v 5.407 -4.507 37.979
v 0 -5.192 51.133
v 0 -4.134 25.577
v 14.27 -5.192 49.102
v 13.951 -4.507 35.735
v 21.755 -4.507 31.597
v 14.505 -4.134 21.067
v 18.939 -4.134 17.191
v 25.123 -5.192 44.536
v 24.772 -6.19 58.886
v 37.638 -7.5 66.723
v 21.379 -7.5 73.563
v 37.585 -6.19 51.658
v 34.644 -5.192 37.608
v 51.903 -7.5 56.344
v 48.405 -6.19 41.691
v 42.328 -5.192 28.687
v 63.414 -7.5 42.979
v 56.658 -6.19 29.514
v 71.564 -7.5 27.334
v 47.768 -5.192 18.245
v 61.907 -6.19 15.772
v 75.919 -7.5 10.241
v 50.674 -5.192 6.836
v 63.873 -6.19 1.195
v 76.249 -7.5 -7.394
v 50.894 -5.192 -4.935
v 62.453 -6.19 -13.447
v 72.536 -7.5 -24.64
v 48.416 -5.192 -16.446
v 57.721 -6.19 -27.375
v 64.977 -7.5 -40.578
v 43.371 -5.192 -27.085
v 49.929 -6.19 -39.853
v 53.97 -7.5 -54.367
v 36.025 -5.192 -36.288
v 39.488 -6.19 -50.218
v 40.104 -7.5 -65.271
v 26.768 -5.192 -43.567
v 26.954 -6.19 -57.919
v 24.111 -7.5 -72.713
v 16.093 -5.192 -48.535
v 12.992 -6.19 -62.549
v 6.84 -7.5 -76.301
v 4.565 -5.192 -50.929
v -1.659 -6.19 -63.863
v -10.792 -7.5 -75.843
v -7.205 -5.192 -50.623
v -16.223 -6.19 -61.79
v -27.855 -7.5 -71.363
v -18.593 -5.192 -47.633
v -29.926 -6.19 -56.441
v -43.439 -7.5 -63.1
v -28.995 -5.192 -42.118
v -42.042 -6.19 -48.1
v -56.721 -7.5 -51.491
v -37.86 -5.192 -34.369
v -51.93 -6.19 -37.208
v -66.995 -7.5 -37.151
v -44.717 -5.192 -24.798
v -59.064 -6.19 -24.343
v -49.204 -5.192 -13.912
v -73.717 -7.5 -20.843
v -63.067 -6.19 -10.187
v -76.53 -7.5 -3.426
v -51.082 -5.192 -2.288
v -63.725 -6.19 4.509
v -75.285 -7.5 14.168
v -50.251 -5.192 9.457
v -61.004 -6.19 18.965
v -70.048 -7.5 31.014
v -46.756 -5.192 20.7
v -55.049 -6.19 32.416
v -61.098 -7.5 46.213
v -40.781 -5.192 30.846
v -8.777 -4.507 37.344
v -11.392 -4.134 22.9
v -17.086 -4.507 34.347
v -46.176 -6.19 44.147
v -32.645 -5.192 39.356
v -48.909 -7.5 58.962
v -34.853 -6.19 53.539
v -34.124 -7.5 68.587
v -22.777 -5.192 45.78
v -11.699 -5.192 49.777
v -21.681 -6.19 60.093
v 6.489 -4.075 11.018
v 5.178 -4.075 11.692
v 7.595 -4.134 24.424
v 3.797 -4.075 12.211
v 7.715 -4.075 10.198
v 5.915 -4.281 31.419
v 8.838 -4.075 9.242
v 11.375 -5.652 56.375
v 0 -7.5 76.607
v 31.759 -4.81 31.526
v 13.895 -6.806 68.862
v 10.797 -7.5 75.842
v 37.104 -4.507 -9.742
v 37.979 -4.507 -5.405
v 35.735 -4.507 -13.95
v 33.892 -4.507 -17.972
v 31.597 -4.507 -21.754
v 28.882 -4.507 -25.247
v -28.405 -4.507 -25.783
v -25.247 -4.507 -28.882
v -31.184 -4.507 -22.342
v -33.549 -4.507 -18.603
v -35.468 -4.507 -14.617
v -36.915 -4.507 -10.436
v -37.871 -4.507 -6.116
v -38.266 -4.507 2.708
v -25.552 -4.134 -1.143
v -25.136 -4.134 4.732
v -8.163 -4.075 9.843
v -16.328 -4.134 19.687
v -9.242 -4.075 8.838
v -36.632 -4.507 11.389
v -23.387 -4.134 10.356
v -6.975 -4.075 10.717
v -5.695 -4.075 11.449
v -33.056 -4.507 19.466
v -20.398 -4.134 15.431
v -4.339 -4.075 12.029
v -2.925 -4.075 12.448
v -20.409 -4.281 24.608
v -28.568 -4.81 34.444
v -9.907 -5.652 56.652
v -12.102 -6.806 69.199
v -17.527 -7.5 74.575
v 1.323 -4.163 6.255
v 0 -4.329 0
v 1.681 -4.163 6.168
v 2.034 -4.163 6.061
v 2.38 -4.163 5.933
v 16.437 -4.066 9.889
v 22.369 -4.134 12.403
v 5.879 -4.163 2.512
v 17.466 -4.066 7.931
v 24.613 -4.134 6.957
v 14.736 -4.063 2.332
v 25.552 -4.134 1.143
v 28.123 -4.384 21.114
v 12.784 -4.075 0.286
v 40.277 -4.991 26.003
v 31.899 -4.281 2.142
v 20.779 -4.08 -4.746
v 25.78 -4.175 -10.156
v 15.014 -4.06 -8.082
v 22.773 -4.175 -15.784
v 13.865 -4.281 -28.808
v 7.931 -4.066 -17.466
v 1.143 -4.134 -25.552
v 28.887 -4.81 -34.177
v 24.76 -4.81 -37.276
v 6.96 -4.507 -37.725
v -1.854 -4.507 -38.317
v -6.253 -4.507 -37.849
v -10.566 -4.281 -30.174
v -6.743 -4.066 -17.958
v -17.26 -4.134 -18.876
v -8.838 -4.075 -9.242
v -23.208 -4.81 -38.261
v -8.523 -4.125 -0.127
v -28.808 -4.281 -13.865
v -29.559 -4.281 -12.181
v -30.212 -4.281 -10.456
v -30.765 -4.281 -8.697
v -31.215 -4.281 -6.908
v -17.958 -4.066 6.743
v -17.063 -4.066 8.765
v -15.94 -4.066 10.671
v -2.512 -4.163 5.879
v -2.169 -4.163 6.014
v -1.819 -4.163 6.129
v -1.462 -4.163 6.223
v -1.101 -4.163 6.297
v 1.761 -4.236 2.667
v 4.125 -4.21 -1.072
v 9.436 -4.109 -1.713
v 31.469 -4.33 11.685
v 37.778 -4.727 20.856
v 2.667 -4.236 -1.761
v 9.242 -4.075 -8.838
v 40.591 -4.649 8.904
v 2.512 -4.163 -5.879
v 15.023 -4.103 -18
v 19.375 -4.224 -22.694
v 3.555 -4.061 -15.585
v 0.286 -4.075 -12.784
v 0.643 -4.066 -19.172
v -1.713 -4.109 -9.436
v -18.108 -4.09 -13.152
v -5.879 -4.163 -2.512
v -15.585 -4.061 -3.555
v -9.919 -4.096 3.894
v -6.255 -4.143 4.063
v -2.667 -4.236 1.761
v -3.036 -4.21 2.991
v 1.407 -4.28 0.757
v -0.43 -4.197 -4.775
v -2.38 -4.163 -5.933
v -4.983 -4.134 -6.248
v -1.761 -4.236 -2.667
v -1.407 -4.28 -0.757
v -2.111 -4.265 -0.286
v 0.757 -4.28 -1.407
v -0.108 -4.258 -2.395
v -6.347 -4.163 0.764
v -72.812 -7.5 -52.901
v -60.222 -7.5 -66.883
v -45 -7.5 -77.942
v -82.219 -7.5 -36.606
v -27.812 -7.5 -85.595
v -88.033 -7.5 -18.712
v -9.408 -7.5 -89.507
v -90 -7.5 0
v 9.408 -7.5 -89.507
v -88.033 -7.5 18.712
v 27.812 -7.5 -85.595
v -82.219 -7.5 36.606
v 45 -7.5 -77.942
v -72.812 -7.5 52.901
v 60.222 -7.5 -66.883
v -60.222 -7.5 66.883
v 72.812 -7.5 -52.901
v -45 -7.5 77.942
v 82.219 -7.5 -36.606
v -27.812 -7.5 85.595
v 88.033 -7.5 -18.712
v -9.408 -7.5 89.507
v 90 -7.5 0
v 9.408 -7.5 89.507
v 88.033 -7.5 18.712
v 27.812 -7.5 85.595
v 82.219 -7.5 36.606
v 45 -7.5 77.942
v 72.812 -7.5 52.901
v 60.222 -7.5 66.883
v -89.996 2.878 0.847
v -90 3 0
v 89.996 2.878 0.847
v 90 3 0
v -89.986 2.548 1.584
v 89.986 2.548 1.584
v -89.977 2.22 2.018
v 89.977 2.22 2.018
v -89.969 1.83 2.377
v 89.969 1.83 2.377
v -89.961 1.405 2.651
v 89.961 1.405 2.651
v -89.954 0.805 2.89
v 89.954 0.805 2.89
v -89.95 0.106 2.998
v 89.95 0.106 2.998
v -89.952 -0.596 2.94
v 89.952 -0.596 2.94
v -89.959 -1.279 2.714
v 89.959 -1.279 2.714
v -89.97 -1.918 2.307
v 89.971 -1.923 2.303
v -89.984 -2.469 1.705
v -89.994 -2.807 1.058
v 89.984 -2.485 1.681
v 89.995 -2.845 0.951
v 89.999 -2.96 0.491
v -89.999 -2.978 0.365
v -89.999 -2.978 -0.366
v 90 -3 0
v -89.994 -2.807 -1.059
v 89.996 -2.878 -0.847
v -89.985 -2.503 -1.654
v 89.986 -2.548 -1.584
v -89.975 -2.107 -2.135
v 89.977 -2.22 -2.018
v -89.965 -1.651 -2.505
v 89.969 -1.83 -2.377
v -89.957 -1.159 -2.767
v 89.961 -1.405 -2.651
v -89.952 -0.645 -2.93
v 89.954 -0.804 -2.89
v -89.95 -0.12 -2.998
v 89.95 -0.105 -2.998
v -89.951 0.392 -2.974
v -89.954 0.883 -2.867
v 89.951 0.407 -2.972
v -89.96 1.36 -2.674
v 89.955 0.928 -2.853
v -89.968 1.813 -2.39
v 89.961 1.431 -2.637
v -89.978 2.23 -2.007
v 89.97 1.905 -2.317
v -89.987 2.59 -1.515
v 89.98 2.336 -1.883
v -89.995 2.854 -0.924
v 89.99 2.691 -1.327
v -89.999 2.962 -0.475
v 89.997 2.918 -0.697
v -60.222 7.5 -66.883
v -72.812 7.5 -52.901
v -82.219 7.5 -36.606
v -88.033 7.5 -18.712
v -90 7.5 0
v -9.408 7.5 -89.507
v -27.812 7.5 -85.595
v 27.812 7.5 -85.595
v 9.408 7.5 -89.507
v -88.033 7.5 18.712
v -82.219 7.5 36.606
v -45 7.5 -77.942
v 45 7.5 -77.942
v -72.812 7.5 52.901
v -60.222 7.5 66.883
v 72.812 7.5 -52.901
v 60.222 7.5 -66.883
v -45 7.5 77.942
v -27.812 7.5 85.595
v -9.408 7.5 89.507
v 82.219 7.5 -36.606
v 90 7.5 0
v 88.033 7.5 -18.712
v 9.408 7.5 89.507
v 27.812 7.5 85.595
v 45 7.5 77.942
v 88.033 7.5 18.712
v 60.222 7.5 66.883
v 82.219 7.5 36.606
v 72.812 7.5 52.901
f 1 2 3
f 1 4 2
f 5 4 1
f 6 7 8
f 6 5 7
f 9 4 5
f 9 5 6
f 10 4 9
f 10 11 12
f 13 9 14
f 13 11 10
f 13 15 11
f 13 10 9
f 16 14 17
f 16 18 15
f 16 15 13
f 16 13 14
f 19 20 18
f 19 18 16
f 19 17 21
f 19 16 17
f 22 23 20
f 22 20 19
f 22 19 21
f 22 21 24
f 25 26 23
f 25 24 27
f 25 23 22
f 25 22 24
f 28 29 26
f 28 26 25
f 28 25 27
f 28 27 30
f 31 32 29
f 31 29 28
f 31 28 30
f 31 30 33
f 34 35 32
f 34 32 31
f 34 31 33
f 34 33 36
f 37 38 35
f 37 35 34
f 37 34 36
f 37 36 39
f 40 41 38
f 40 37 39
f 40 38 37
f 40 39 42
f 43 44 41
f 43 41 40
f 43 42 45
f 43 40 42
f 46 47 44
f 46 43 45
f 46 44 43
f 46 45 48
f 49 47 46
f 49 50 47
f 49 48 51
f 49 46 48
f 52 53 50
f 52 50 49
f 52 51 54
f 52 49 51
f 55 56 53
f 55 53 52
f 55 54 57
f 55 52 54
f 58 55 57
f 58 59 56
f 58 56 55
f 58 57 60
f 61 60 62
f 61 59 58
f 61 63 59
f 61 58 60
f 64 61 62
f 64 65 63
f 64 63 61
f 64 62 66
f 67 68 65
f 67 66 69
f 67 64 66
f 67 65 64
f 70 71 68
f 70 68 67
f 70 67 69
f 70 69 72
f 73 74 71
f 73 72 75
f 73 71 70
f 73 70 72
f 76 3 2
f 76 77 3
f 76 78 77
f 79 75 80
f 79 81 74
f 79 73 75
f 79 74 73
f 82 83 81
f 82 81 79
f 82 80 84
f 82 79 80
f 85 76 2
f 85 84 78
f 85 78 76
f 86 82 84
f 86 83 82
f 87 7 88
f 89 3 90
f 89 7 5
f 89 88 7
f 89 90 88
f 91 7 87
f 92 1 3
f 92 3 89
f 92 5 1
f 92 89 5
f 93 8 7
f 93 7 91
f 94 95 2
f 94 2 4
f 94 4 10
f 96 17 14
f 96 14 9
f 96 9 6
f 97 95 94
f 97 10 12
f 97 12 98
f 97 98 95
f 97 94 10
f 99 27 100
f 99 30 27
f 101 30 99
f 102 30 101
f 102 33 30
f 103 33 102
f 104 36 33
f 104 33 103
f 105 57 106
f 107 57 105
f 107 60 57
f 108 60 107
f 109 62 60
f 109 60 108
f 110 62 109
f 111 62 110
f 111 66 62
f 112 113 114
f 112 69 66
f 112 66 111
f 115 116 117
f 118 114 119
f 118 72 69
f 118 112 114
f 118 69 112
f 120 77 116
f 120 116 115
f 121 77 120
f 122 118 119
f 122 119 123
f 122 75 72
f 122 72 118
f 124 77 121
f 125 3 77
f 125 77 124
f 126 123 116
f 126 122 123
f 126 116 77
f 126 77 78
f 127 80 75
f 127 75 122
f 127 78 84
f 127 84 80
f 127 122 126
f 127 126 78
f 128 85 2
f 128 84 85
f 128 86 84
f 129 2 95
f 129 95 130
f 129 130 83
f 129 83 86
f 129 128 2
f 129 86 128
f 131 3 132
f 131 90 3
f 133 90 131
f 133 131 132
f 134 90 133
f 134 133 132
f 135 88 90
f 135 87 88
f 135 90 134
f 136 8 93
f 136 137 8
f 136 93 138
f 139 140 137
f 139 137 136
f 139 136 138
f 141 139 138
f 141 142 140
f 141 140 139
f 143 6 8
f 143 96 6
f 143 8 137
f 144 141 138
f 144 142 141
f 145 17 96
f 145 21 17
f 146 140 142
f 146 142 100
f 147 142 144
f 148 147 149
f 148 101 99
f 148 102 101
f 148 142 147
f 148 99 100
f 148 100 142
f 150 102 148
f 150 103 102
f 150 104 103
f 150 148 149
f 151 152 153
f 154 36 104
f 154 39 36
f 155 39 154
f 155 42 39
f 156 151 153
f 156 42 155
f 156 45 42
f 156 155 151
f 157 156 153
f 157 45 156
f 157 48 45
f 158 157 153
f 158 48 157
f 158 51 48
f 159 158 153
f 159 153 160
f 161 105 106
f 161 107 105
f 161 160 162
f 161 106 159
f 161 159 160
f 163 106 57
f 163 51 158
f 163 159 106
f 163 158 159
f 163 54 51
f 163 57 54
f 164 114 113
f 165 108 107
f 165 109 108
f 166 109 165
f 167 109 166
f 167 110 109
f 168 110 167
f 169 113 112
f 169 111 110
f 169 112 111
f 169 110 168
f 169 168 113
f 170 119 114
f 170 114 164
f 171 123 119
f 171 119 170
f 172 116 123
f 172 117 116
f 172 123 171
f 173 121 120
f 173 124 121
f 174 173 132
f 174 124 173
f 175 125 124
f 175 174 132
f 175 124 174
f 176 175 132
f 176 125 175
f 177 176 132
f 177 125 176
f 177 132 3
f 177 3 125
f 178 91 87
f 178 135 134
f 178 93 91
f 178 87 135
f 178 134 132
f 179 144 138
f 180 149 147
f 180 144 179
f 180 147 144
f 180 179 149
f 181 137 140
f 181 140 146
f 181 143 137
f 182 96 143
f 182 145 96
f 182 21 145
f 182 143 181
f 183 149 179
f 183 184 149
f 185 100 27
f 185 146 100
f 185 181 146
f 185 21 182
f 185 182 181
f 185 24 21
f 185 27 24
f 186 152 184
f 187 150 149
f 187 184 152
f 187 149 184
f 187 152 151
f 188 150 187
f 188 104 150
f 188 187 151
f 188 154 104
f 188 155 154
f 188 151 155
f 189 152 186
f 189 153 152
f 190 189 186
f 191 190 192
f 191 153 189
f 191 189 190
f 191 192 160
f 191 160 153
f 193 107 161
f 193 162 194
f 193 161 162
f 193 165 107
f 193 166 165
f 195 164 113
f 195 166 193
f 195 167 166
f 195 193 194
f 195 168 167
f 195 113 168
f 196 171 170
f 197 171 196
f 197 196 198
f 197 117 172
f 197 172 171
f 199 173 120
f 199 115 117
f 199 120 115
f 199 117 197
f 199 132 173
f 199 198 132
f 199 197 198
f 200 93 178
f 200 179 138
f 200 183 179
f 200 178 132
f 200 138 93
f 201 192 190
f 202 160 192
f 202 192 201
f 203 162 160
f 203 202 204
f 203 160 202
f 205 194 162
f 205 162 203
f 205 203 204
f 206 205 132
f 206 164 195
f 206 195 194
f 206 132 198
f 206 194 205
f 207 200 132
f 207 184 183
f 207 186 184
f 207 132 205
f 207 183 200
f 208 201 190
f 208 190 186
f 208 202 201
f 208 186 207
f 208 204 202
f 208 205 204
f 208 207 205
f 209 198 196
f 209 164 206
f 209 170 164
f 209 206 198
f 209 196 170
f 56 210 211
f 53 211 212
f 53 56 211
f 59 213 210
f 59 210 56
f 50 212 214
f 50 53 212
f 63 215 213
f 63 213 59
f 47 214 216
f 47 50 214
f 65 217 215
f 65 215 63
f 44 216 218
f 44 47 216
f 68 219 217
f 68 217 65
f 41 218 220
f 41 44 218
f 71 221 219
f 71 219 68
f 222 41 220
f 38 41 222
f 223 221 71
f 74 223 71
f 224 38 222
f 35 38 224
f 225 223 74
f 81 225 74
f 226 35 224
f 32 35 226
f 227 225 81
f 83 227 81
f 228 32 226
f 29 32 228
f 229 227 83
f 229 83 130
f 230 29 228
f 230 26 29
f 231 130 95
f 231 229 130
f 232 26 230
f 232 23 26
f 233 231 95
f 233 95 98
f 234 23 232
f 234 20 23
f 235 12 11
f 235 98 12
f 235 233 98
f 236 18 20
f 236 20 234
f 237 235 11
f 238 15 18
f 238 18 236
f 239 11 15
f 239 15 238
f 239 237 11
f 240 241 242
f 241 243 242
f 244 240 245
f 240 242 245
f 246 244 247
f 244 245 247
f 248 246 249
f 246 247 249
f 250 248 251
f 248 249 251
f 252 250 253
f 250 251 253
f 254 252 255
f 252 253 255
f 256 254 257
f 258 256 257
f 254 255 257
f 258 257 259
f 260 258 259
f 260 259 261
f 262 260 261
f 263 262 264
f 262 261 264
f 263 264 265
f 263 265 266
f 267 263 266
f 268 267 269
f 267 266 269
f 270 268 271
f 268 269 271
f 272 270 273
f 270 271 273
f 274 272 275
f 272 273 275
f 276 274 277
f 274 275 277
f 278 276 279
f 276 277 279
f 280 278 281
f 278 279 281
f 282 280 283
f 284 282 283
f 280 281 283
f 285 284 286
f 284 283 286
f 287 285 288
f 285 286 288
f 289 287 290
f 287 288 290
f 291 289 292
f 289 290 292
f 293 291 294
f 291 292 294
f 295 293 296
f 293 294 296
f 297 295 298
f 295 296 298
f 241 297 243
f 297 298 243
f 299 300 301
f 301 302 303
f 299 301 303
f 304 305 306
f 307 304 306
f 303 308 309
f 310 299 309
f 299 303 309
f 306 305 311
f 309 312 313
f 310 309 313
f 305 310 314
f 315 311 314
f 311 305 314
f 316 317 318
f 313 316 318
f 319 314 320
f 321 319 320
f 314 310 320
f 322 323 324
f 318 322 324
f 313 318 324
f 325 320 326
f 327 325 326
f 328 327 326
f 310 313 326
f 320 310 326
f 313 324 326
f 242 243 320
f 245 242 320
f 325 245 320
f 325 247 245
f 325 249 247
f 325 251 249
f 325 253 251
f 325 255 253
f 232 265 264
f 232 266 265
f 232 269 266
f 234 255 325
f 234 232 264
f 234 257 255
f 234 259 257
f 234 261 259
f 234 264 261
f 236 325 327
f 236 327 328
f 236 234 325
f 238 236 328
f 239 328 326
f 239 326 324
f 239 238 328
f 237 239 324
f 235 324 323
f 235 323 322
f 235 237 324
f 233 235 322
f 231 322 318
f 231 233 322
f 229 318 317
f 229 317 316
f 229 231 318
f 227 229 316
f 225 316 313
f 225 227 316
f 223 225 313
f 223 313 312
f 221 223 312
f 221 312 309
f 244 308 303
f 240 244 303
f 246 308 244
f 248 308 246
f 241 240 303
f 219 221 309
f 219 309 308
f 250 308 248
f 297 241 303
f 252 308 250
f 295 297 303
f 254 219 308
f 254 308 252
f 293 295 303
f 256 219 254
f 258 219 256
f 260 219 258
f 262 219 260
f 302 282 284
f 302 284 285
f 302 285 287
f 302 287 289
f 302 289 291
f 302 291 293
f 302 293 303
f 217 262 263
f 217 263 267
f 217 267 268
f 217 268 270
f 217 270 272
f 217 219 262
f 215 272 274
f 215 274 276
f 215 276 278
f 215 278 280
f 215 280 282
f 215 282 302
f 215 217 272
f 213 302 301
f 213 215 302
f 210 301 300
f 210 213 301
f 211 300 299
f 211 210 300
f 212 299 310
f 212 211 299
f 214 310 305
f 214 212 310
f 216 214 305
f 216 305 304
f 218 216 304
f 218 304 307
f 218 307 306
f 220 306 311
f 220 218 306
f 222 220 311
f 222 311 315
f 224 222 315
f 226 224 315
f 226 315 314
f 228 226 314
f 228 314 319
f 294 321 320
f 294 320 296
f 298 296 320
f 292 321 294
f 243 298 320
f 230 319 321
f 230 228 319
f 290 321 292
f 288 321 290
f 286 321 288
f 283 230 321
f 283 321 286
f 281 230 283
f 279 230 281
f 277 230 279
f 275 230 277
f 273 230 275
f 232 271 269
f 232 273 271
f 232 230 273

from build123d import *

# Parameters (mm, degrees)
F0_R     = 90
F1_DEPTH = 7.5
F2_R     = 3
F3_DEPTH = 90


with BuildPart() as f1:
    # F0 (on Front) → F1 (new body, symmetric)
    with BuildSketch(Plane.XZ):
        Circle(F0_R)
    extrude(amount=F1_DEPTH, both=True)

    # F2 (on Right) → F3 (cut, symmetric)
    with BuildSketch(Plane.YZ):
        Circle(F2_R)
    extrude(amount=F3_DEPTH, both=True, mode=Mode.SUBTRACT)

    # F5 (on Right) → F6 (revolve, cut)
    with BuildSketch(Plane.YZ):
        with BuildLine():
            Line((-7.9027169537, 80), (-7.9027169537, 0))
            Line((-7.9027169537, 0), (-4.3293770832, 0))
            ThreePointArc((-4.3293770832, 0), (-4.580031519, 40.0686088178), (-7.9027169537, 80))
        make_face()
    revolve(axis=Axis((0, 1.0657925159, 0), (0, 1, 0)), mode=Mode.SUBTRACT)


solid = f1.part
